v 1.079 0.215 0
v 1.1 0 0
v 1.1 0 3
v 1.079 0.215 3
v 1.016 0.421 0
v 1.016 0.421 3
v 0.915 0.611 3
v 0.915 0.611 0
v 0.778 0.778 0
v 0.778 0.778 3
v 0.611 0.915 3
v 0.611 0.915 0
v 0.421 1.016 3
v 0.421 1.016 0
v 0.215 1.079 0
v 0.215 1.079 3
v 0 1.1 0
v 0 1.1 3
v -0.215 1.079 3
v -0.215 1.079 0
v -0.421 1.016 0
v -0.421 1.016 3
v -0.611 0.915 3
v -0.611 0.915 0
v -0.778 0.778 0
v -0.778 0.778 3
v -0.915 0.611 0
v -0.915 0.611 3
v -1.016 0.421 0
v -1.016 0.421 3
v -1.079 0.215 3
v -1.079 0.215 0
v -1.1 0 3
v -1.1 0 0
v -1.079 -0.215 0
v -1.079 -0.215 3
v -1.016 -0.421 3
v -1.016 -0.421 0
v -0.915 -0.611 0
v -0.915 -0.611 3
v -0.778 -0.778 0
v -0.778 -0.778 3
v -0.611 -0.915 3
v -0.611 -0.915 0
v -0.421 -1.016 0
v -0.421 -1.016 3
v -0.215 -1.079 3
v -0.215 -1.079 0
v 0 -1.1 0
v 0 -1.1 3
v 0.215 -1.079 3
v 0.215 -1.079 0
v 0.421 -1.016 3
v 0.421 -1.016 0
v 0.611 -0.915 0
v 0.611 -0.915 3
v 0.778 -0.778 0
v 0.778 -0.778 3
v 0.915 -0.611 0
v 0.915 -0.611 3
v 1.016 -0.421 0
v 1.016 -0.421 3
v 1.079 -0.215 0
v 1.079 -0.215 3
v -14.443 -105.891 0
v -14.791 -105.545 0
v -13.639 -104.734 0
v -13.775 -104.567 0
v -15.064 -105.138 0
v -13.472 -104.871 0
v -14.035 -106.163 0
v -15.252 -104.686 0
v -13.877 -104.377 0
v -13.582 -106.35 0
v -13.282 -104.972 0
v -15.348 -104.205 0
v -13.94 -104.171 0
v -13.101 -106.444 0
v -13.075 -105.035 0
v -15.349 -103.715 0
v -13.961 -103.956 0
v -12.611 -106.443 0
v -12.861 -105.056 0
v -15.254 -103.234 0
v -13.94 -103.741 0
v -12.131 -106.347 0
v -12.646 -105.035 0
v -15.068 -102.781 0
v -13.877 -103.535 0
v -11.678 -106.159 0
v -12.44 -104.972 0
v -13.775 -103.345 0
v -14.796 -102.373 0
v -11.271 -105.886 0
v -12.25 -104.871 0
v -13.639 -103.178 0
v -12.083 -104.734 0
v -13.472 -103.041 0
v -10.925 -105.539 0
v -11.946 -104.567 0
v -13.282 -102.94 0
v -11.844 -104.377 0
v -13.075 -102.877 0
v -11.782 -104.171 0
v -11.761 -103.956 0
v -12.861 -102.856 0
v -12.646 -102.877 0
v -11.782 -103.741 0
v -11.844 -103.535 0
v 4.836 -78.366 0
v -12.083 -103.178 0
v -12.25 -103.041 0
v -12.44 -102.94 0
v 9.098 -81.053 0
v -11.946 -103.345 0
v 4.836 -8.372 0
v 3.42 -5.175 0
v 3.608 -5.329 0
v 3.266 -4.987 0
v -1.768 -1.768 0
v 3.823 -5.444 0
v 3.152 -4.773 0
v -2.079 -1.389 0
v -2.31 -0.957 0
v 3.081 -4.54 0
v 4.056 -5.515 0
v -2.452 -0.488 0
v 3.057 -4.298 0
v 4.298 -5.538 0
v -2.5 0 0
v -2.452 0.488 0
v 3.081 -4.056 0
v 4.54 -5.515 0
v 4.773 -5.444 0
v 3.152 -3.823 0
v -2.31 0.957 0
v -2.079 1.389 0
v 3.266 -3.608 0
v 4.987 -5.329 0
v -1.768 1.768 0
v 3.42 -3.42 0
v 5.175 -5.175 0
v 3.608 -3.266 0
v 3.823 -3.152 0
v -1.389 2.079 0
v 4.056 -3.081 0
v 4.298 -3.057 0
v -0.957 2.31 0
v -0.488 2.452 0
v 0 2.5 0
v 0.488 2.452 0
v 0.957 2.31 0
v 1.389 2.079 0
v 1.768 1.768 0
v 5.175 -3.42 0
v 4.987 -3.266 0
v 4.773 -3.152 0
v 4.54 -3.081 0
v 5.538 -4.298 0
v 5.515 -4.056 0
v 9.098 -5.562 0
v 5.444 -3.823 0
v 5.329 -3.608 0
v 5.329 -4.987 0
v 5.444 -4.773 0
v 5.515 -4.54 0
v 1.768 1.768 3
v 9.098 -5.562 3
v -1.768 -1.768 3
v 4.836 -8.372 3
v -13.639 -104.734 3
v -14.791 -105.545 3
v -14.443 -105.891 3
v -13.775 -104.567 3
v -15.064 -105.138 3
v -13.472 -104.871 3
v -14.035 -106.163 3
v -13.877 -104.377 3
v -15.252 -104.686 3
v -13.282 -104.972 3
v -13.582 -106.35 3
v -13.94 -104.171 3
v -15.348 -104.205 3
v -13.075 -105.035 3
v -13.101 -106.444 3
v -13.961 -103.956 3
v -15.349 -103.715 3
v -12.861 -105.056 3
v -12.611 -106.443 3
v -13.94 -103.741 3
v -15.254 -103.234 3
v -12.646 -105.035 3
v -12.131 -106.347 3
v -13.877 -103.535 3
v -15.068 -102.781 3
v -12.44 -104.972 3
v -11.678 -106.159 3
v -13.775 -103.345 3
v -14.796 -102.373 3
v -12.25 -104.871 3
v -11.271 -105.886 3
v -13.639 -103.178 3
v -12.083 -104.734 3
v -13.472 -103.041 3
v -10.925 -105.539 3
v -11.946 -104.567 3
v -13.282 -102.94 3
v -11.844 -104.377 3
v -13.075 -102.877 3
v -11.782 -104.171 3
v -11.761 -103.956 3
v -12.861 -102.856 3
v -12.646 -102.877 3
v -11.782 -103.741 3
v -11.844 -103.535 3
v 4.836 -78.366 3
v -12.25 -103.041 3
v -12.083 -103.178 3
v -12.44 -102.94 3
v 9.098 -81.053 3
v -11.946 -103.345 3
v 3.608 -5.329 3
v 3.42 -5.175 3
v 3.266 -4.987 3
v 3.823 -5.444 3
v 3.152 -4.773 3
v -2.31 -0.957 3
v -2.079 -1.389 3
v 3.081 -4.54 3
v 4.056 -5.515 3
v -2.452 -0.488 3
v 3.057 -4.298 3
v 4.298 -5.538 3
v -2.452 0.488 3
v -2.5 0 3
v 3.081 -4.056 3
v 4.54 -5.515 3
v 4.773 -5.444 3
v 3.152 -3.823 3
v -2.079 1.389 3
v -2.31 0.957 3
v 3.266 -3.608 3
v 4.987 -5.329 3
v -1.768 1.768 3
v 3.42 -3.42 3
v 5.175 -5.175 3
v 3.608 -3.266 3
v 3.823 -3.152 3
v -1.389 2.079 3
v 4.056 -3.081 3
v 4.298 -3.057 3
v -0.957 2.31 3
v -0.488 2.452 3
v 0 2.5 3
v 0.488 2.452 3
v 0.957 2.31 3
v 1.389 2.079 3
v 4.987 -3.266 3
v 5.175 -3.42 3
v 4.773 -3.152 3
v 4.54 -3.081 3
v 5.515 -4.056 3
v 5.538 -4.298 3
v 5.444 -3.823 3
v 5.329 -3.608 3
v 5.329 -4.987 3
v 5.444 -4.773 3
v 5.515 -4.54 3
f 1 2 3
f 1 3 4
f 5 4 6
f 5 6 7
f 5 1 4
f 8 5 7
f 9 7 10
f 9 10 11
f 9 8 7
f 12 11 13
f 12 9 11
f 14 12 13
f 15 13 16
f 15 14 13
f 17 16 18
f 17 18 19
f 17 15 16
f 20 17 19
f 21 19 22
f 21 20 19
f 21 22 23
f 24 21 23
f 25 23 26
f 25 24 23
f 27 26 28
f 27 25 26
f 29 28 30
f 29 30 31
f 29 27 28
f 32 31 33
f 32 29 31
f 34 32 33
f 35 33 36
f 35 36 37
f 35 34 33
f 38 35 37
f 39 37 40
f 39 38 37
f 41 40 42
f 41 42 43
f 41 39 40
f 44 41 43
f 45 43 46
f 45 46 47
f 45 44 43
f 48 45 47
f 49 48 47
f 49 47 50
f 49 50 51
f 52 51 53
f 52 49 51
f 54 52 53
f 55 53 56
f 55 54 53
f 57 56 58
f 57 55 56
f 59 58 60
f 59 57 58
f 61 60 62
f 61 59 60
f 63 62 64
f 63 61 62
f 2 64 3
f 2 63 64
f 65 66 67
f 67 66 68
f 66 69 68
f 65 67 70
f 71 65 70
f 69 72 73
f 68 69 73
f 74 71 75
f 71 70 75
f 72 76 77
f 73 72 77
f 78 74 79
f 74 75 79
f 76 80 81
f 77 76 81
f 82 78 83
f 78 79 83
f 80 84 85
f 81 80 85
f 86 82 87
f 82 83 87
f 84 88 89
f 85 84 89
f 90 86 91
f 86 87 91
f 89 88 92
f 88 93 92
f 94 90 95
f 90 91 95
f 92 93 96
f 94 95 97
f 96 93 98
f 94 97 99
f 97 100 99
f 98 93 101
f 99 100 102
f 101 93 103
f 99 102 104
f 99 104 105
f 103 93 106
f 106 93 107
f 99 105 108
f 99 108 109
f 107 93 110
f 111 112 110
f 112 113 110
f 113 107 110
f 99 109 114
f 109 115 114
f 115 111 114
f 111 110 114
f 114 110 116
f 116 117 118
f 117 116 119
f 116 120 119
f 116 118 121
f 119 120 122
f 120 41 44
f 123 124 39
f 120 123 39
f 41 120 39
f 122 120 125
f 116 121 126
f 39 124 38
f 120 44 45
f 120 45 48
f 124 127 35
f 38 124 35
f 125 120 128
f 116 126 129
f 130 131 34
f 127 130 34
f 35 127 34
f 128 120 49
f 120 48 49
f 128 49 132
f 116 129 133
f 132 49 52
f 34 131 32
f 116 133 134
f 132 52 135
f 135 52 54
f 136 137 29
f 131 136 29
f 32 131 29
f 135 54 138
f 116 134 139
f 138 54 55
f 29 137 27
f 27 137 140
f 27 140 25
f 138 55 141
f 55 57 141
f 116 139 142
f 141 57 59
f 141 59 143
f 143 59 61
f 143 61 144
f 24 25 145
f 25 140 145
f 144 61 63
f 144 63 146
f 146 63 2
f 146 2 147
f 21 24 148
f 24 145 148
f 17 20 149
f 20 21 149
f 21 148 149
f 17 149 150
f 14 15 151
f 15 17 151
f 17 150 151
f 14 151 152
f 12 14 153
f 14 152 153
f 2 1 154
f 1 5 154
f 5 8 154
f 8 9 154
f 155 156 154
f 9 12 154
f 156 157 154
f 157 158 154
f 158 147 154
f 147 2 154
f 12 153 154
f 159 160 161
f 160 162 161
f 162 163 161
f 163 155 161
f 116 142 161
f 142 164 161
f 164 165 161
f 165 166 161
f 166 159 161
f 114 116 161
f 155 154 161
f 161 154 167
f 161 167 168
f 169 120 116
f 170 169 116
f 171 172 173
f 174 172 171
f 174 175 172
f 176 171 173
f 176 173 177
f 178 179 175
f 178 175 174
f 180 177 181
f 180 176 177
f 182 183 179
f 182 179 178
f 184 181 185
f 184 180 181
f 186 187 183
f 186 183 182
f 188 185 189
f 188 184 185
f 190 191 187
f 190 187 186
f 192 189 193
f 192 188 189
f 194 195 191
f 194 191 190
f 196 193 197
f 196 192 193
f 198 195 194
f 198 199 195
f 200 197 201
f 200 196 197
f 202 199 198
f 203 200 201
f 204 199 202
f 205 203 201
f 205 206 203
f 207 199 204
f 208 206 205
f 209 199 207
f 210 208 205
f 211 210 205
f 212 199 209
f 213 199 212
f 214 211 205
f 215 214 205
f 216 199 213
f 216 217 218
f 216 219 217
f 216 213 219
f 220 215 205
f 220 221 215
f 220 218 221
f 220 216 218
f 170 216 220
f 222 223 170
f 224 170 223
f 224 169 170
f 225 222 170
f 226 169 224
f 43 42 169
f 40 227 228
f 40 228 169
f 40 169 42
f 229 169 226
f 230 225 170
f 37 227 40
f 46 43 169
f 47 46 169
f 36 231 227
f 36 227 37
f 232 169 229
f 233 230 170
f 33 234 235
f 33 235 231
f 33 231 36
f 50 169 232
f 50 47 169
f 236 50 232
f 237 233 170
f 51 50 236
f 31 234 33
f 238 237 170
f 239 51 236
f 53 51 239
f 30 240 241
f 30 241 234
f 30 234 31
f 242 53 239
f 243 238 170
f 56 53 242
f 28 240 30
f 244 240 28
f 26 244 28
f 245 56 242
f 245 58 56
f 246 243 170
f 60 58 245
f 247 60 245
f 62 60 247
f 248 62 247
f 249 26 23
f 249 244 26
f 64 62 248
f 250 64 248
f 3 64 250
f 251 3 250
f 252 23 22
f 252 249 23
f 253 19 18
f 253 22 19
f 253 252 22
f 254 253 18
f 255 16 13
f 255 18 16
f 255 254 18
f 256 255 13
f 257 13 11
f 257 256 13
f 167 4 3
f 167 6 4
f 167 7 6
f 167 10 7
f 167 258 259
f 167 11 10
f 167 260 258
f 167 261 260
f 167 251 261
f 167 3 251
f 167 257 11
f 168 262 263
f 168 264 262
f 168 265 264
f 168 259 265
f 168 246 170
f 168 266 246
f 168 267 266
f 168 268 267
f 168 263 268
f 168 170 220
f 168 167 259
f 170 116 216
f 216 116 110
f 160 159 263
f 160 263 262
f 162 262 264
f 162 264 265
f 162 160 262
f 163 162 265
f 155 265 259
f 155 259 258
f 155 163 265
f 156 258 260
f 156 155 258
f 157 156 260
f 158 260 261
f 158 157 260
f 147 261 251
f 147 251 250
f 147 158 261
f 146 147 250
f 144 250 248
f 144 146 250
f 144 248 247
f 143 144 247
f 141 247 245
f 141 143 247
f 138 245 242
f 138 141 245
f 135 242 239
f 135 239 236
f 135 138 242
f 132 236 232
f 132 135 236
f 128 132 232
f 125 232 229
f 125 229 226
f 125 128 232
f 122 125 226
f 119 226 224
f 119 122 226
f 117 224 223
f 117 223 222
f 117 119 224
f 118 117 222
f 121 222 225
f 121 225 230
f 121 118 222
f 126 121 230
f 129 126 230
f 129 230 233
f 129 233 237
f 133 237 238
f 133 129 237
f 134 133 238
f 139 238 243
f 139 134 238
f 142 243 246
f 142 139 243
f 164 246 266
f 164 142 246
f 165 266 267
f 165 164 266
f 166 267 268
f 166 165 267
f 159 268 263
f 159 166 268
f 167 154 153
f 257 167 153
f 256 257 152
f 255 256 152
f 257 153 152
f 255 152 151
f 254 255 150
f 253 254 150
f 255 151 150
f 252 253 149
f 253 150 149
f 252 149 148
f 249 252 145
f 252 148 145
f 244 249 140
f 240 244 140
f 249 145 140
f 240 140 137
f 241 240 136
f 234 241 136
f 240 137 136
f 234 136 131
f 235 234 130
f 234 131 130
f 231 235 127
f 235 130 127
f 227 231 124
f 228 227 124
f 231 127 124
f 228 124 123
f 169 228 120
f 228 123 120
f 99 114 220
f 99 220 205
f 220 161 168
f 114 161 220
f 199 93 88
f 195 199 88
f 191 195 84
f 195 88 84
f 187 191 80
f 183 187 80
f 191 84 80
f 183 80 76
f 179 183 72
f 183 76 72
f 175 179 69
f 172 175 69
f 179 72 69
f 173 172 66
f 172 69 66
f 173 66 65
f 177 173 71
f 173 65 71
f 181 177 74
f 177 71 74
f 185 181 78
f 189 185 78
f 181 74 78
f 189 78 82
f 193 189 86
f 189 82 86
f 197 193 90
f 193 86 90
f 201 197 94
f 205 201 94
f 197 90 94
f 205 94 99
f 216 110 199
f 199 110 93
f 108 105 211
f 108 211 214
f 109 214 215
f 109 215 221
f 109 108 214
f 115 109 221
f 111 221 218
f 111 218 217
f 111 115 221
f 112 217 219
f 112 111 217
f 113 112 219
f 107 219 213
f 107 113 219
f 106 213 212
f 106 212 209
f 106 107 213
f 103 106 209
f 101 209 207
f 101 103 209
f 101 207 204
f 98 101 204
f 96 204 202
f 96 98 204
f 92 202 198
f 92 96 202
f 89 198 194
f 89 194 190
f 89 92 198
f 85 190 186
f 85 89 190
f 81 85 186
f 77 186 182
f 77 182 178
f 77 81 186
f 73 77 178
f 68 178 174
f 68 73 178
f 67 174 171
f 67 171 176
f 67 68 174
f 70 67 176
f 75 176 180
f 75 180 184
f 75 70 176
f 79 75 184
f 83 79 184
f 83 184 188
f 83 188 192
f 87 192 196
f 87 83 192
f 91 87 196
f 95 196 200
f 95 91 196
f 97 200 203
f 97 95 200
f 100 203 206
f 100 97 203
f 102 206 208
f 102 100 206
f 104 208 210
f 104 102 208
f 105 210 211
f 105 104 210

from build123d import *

# Parameters (mm, degrees)
SKETCH_1_R   = 1.1
SKETCH_1_R_2 = 1.240624
PAD_DEPTH    = 3


with BuildPart() as part:
    # Sketch_1 → Pad (new body)
    with BuildSketch(Plane.XY):
        with BuildLine():
            ThreePointArc((1.767767, 1.767767), (-1.767767, 1.767767), (-1.767767, -1.767767))
            Line((-1.767767, -1.767767), (4.836212, -8.371746))
            Line((4.836212, -8.371746), (4.836212, -78.366013))
            Line((4.836212, -78.366013), (-14.796054, -102.373325))
            ThreePointArc((-14.796054, -102.373325), (-14.44337, -105.891224), (-10.925471, -105.53854))
            Line((9.09799, -81.052855), (-10.925471, -105.53854))
            Line((9.09799, -5.562456), (9.09799, -81.052855))
            Line((1.767767, 1.767767), (9.09799, -5.562456))
        make_face()
        with Locations((-12.860762, -103.955933)):
            Circle(SKETCH_1_R, mode=Mode.SUBTRACT)
        Circle(SKETCH_1_R, mode=Mode.SUBTRACT)
        with Locations((4.297746, -4.297745)):
            Circle(SKETCH_1_R_2, mode=Mode.SUBTRACT)
    extrude(amount=PAD_DEPTH)


solid = part.part
